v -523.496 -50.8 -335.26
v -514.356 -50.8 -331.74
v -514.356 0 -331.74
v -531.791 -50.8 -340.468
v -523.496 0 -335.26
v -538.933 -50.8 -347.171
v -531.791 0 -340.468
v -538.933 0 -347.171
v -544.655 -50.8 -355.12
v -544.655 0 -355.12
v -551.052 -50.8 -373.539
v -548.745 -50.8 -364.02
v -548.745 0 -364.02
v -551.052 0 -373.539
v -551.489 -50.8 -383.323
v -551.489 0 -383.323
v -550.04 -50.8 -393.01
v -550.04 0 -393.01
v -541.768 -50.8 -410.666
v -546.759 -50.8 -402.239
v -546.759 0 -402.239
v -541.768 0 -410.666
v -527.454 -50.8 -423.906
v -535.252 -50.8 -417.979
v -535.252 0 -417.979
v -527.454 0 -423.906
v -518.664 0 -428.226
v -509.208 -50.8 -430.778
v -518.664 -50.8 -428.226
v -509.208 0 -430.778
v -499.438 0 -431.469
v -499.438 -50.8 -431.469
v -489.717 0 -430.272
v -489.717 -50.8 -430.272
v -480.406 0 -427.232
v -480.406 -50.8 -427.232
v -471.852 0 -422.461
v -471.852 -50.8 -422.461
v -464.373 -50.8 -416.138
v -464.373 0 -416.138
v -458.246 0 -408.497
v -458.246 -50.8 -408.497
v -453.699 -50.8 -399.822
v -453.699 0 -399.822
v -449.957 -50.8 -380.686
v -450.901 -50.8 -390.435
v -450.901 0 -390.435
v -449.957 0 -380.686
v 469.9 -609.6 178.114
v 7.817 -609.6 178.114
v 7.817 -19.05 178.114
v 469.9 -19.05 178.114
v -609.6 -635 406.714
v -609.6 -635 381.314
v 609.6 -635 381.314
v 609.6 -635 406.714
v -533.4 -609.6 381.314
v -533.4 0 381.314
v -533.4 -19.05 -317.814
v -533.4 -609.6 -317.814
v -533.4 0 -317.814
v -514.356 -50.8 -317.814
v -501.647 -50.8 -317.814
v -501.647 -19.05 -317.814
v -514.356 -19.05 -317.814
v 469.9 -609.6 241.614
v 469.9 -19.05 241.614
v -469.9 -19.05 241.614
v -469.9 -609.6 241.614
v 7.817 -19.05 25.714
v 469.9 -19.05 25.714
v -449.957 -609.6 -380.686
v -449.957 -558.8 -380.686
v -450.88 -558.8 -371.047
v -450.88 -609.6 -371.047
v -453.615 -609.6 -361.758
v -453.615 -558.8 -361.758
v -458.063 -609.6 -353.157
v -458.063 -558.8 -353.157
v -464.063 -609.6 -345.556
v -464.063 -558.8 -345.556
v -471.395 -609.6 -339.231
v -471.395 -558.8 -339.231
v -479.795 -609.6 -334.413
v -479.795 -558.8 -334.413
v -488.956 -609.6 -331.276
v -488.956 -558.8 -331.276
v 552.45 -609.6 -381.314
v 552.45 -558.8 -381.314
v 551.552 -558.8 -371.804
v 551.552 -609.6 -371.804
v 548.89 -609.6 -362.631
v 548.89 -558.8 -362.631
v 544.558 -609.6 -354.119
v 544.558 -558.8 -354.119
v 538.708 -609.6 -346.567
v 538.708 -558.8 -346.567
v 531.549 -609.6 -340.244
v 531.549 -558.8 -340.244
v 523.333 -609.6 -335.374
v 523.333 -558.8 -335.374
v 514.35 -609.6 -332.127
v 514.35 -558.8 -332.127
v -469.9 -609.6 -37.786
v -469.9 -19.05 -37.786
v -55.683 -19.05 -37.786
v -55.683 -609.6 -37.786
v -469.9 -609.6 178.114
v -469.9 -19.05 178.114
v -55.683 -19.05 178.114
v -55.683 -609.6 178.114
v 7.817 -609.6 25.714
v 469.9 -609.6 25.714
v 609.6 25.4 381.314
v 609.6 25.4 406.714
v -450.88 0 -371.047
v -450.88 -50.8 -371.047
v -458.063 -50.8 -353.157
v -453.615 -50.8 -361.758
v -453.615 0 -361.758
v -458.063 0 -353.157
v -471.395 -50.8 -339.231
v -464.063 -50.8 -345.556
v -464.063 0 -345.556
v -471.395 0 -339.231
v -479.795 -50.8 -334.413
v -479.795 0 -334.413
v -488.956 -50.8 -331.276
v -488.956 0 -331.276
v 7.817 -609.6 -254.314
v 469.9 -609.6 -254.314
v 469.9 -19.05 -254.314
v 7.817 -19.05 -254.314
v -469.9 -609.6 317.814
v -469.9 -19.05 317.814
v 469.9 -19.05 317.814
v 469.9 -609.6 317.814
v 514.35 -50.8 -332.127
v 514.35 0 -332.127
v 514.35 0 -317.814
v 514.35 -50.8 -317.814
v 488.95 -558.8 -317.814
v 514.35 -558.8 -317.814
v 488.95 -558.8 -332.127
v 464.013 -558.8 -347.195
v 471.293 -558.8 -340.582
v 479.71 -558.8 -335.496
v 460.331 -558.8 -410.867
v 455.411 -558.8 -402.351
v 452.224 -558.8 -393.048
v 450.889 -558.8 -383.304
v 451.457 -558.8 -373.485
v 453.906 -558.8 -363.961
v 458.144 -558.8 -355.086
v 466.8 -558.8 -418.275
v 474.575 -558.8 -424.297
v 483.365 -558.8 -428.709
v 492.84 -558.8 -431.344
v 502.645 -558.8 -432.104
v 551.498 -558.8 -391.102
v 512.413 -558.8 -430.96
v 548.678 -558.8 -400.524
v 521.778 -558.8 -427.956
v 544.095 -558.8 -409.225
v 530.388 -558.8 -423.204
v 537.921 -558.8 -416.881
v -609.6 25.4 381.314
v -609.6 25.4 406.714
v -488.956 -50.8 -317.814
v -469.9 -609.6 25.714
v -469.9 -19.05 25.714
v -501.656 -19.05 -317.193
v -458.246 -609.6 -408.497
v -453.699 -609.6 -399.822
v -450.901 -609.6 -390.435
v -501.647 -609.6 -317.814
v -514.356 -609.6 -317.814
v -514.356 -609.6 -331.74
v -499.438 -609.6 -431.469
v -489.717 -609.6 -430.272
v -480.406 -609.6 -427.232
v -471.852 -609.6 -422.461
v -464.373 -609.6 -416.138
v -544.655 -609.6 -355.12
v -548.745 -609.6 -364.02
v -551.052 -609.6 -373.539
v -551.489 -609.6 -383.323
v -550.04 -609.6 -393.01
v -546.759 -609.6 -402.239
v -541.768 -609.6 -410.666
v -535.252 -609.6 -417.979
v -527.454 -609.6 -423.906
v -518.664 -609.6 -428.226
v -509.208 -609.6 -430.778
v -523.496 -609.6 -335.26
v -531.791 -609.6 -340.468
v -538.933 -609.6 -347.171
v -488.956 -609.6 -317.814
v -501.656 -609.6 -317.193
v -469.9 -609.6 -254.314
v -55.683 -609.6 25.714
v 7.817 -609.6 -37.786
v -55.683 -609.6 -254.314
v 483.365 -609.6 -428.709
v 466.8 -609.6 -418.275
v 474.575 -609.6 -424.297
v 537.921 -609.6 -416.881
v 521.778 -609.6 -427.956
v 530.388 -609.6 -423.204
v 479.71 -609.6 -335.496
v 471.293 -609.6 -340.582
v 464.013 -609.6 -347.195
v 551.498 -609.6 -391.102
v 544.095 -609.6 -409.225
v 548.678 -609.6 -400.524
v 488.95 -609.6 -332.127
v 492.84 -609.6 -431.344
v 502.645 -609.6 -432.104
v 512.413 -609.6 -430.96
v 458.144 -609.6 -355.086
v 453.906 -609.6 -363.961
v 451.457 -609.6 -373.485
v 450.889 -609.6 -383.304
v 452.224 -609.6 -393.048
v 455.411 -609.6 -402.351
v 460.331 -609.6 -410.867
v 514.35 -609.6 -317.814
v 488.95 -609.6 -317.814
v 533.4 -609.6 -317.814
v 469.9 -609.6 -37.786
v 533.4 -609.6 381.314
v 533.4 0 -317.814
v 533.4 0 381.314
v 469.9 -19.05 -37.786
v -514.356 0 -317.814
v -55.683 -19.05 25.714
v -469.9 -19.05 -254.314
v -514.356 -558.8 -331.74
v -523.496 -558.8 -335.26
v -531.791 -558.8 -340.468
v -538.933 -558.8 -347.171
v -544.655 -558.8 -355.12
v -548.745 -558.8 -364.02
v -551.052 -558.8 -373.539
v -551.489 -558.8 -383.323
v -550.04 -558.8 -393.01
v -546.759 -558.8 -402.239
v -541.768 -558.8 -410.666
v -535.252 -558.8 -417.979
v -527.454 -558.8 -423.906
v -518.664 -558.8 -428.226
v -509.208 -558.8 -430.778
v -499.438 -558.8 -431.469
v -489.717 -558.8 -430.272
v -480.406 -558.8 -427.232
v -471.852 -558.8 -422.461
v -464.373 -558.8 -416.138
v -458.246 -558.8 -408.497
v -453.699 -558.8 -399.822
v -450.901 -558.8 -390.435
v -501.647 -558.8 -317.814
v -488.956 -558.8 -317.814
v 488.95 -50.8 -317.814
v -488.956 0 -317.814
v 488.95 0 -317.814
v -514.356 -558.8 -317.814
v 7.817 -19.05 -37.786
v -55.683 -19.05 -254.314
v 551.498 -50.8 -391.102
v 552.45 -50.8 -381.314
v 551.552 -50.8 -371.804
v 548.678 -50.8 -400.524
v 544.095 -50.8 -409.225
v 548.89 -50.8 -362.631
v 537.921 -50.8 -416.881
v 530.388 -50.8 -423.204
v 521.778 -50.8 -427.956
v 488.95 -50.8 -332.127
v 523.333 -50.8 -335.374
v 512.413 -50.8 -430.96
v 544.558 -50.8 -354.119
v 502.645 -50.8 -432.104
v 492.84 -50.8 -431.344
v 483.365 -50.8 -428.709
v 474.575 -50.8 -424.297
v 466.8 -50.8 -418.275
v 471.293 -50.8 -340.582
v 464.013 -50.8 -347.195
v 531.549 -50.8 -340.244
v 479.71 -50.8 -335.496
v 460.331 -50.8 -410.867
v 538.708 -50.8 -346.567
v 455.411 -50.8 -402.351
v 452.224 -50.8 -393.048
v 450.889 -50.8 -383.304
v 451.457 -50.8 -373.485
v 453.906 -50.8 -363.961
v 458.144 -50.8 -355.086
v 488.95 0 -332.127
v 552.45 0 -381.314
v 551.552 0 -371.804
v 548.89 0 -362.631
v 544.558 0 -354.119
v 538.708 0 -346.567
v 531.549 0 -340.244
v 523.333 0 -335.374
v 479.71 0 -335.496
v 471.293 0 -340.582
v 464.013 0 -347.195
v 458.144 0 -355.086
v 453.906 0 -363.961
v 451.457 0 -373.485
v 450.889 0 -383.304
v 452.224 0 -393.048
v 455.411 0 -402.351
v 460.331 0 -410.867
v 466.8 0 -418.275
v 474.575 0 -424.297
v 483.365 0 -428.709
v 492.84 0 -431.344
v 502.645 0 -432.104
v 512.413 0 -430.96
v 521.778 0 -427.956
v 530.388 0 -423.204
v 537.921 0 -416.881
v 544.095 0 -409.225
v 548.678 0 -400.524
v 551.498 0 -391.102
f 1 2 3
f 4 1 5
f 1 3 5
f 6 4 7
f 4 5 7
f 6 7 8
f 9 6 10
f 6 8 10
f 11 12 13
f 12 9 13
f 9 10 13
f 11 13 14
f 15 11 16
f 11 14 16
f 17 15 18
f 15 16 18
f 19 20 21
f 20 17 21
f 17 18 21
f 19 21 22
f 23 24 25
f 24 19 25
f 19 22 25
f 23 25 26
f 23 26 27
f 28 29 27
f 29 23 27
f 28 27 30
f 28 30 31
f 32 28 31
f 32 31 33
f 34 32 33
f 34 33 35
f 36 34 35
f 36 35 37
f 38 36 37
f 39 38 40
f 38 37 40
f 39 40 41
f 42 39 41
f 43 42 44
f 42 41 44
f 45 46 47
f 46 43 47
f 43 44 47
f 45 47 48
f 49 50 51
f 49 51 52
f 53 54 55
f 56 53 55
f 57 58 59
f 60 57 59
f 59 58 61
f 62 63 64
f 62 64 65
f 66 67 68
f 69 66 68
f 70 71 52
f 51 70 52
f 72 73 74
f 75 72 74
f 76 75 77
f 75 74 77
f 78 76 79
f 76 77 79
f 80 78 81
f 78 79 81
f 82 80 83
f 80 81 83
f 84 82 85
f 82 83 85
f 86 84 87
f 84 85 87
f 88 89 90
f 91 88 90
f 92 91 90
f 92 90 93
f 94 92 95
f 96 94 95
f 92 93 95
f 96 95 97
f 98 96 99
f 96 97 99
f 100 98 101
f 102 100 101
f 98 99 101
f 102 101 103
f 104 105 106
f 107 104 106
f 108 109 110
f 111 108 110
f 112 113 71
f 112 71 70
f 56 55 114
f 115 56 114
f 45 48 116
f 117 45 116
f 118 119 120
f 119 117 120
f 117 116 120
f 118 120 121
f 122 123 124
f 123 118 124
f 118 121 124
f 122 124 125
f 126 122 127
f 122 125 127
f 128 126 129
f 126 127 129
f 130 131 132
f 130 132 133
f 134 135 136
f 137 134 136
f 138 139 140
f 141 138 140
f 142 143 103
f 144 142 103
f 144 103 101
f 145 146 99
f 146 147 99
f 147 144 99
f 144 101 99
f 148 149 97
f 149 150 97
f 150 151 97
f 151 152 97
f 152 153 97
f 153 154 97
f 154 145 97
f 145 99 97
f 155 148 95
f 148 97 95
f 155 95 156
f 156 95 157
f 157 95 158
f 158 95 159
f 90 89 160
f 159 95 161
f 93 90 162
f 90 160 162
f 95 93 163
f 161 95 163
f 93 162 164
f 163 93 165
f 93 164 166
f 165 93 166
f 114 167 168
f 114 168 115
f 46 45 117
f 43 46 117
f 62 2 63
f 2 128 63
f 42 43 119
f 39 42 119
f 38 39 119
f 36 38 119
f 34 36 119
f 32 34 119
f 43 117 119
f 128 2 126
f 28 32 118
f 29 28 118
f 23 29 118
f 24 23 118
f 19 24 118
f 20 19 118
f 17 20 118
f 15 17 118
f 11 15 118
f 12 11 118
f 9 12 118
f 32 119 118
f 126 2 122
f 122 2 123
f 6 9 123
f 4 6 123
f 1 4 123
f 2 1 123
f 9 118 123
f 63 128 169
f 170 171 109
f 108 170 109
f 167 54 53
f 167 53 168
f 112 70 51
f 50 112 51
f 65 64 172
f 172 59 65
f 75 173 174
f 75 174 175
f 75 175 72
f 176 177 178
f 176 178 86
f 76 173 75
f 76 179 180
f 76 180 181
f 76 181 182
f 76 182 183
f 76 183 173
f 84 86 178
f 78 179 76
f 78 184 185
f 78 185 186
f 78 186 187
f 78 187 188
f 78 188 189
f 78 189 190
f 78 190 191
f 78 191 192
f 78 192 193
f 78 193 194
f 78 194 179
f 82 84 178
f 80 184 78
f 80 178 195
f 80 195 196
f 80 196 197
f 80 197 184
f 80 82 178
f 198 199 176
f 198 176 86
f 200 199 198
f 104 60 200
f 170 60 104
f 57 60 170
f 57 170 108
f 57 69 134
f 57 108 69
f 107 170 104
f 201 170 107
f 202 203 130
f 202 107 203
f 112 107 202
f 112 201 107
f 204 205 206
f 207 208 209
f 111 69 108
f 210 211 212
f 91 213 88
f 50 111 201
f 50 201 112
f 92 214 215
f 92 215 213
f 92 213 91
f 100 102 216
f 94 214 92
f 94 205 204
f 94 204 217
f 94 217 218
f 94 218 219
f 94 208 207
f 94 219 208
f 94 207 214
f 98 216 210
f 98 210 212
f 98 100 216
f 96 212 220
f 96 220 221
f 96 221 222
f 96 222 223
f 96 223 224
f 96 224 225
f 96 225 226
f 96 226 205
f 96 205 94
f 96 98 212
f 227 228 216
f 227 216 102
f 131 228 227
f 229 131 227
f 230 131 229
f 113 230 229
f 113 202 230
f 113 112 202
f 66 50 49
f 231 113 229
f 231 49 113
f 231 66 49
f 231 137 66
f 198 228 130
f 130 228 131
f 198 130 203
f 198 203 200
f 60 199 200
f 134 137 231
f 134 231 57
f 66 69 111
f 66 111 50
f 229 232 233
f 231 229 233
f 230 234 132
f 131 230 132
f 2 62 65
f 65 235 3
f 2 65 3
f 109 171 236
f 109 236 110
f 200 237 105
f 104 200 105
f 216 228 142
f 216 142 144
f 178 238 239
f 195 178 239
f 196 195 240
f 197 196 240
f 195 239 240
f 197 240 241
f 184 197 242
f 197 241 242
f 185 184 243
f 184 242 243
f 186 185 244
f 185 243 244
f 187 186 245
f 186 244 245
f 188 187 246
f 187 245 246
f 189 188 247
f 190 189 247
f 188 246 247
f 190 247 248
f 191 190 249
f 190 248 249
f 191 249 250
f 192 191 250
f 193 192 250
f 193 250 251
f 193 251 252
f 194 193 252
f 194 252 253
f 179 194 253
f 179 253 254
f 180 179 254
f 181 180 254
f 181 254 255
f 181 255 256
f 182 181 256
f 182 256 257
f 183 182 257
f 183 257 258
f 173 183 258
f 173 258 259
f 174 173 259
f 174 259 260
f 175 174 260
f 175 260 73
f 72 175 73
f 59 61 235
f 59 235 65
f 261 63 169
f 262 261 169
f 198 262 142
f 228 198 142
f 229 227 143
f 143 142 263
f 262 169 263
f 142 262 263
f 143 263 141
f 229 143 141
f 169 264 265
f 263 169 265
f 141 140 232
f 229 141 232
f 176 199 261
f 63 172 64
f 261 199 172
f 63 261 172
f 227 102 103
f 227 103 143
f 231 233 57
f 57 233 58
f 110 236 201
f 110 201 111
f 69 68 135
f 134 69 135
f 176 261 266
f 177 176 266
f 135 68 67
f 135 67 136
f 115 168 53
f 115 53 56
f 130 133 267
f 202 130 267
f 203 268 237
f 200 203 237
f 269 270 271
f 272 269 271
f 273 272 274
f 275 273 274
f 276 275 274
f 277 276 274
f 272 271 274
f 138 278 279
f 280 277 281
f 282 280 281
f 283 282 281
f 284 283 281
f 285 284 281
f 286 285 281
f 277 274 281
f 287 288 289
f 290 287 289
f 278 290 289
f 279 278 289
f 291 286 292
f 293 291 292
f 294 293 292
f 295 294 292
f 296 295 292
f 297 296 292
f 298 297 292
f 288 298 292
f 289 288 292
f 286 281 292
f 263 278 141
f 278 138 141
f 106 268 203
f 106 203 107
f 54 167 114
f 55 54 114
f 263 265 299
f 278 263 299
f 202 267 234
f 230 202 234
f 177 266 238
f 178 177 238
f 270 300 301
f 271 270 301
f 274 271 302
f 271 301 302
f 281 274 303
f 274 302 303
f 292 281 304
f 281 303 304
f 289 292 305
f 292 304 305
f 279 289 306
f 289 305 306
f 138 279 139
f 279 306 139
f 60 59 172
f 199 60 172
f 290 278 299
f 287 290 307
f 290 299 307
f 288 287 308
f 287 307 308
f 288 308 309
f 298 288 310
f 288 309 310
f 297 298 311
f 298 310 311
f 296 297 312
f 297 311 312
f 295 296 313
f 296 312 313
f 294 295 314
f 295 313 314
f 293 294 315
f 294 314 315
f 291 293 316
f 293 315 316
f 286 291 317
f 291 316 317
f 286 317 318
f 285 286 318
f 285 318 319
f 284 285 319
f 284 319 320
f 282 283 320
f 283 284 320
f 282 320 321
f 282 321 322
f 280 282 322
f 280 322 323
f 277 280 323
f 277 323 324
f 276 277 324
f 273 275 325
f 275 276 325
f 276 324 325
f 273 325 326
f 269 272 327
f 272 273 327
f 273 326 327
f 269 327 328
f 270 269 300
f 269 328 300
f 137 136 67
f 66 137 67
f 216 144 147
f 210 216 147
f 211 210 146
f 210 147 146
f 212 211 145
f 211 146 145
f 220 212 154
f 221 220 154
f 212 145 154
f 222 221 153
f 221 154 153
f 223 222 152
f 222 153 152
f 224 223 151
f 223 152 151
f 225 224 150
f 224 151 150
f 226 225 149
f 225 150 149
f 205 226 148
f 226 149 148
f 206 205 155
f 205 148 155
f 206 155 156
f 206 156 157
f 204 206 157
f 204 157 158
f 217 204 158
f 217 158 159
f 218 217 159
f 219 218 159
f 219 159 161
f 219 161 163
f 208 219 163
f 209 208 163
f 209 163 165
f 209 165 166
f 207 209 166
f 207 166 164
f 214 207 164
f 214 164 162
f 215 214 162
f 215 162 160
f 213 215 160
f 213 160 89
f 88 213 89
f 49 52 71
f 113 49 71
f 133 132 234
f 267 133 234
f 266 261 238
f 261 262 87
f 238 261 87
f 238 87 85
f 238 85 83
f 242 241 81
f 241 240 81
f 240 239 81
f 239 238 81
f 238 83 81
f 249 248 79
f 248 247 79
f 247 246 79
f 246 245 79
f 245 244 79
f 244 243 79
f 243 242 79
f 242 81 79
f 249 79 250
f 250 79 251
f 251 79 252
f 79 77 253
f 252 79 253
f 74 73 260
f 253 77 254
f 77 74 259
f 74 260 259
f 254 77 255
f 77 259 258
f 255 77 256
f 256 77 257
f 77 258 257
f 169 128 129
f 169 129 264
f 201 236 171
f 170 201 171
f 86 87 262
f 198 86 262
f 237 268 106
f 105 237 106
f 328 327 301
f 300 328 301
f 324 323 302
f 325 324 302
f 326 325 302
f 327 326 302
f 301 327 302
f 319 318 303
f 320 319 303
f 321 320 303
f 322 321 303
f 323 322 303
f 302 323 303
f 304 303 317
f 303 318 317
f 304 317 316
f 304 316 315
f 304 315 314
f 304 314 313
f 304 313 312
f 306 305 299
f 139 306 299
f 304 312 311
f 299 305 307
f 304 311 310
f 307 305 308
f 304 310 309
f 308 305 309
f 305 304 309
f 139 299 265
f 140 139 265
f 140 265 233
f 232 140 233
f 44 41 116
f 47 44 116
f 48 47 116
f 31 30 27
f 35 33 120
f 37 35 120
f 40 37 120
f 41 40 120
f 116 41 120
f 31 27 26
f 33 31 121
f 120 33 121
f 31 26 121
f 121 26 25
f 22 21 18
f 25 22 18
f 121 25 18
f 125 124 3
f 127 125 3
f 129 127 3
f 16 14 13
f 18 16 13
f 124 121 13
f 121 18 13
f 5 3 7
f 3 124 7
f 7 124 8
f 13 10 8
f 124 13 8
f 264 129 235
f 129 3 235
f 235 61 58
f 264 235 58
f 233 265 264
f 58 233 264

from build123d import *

# Parameters (mm, degrees)
F0_W     = 414.2166706732
F0_H     = 63.5
F0_W_2   = 63.5
F0_H_2   = 216.5272635669
F0_W_3   = 462.0833293268
F0_H_3   = 152.4
F1_DEPTH = 609.6
F2_DEPTH = 609.6
F5_DEPTH = 1242.06
F6_W     = 19.05
F6_H     = 699.1272635669
F7_DEPTH = 1066.8
F8_W     = 1219.2
F8_H     = 660.4
F8_W_2   = 1066.8
F8_H_2   = 609.6
F9_DEPTH = 25.4


with BuildPart() as f1:
    # F0 (on Front) → F1 (new body)
    with BuildSketch(Plane.XZ):
        Polygon((469.9, -273.3665645704), (469.9, -317.8136317834), (488.95, -317.8136317834), (488.95, -292.4136317834), (514.35, -292.4136317834), (514.35, -317.8136317834), (533.4, -317.8136317834), (533.4, 317.8136317834), (469.9, 317.8136317834), (469.9, 241.6136317834), (469.9, 178.1136317834), (469.9, 25.7136317834), (469.9, -37.7863682166), (469.9, -254.3136317834), align=None)
        Polygon((-469.9, -317.8136317834), (469.9, -317.8136317834), (469.9, -273.3665645704), (469.9, -254.3136317834), (7.8166706732, -254.3136317834), (-55.6833293268, -254.3136317834), (-469.9, -254.3136317834), align=None)
        Polygon((-488.9560716881, -317.8136317834), (-469.9, -317.8136317834), (-469.9, -254.3136317834), (-469.9, -37.7863682166), (-469.9, 25.7136317834), (-469.9, 178.1136317834), (-469.9, 241.6136317834), (-469.9, 317.8136317834), (-533.4, 317.8136317834), (-533.4, -317.8136317834), (-514.3560716881, -317.4411400029), (-514.3560716881, -291.792732976), (-488.9560716881, -291.792732976), align=None)
        Polygon((488.95, -292.4136317834), (488.95, -317.8136317834), (501.65, -317.8136317834), (514.35, -317.8136317834), (514.35, -292.4136317834), align=None)
        Polygon((-501.6472799932, -317.8136317834), (-488.9560716881, -317.8136317834), (-488.9560716881, -291.792732976), (-514.3560716881, -291.792732976), (-514.3560716881, -317.4411400029), (-501.6560716881, -317.192732976), align=None)
        with Locations((-262.7916646634, -6.0363682166)):
            Rectangle(F0_W, F0_H)
        with Locations((-23.9333293268, -146.05)):
            Rectangle(F0_W_2, F0_H_2)
        with Locations((238.8583353366, -6.0363682166)):
            Rectangle(F0_W_3, F0_H)
        with Locations((-23.9333293268, -6.0363682166)):
            Rectangle(F0_W_2, F0_H)
        Polygon((-469.9, 241.6136317834), (-469.9, 178.1136317834), (-55.6833293268, 178.1136317834), (7.8166706732, 178.1136317834), (469.9, 178.1136317834), (469.9, 241.6136317834), align=None)
        with Locations((-23.9333293268, 101.9136317834)):
            Rectangle(F0_W_2, F0_H_3)
        Polygon((469.9, 317.8136317834), (533.4, 317.8136317834), (533.4, 381.3136317834), (-533.4, 381.3136317834), (-533.4, 317.8136317834), (-469.9, 317.8136317834), align=None)
    extrude(amount=F1_DEPTH)

    # F0 (on Front) → F2 (join)
    with BuildSketch(Plane.XZ):
        with BuildLine():
            ThreePointArc((-449.9570255615, -380.6863682166), (-460.8814161194, -349.2129544898), (-488.9560716881, -331.2760708315))
            Line((-488.9560716881, -331.2760708315), (-488.9560716881, -342.592732976))
            Line((-488.9560716881, -342.592732976), (-501.2964171884, -342.592732976))
            Line((-501.2964171884, -342.592732976), (-514.3560716881, -342.592732976))
            Line((-514.3560716881, -342.592732976), (-514.3560716881, -331.7404190027))
            ThreePointArc((-514.3560716881, -331.7404190027), (-531.4963200945, -421.1305986038), (-449.9570255615, -380.6863682166))
        make_face()
        with BuildLine():
            Line((-501.2964171884, -342.592732976), (-501.4762624628, -329.8914600241))
            ThreePointArc((-501.4762624628, -329.8914600241), (-507.9756105712, -330.4018573762), (-514.3560716881, -331.7404190027))
            Line((-514.3560716881, -331.7404190027), (-514.3560716881, -342.592732976))
            Line((-514.3560716881, -342.592732976), (-501.2964171884, -342.592732976))
        make_face()
        with BuildLine():
            Line((-501.4762624628, -329.8914600241), (-501.6472799932, -317.8136317834))
            Line((-501.6472799932, -317.8136317834), (-514.3560716881, -317.8136317834))
            Line((-514.3560716881, -317.8136317834), (-514.3560716881, -331.7404190027))
            ThreePointArc((-514.3560716881, -331.7404190027), (-507.9756105712, -330.4018573762), (-501.4762624628, -329.8914600241))
        make_face()
        with BuildLine():
            Line((-488.9560716881, -331.2760708315), (-488.9560716881, -317.8136317834))
            Line((-488.9560716881, -317.8136317834), (-501.6472799932, -317.8136317834))
            Line((-501.6472799932, -317.8136317834), (-501.4762624628, -329.8914600241))
            ThreePointArc((-501.4762624628, -329.8914600241), (-495.1730843427, -330.194194561), (-488.9560716881, -331.2760708315))
        make_face()
        with BuildLine():
            Line((-488.9560716881, -342.592732976), (-488.9560716881, -331.2760708315))
            ThreePointArc((-488.9560716881, -331.2760708315), (-495.1730843427, -330.194194561), (-501.4762624628, -329.8914600241))
            Line((-501.4762624628, -329.8914600241), (-501.2964171884, -342.592732976))
            Line((-501.2964171884, -342.592732976), (-488.9560716881, -342.592732976))
        make_face()
        with BuildLine():
            Line((488.95, -343.2136317834), (488.95, -332.1267432866))
            ThreePointArc((488.95, -332.1267432866), (470.5414802667, -421.4745580676), (552.45, -381.3136317834))
            ThreePointArc((552.45, -381.3136317834), (541.8109262841, -350.2051120501), (514.35, -332.1267432866))
            Line((514.35, -332.1267432866), (514.35, -343.2136317834))
            Line((514.35, -343.2136317834), (501.65, -343.2136317834))
            Line((501.65, -343.2136317834), (488.95, -343.2136317834))
        make_face()
        with BuildLine():
            ThreePointArc((514.35, -332.1267432866), (508.0510180581, -330.9185232131), (501.65, -330.5136317834))
            Line((501.65, -330.5136317834), (501.65, -343.2136317834))
            Line((501.65, -343.2136317834), (514.35, -343.2136317834))
            Line((514.35, -343.2136317834), (514.35, -332.1267432866))
        make_face()
        with BuildLine():
            Line((501.65, -317.8136317834), (488.95, -317.8136317834))
            Line((488.95, -317.8136317834), (488.95, -332.1267432866))
            ThreePointArc((488.95, -332.1267432866), (495.2489819419, -330.9185232131), (501.65, -330.5136317834))
            Line((501.65, -330.5136317834), (501.65, -317.8136317834))
        make_face()
        with BuildLine():
            Line((514.35, -317.8136317834), (501.65, -317.8136317834))
            Line((501.65, -317.8136317834), (501.65, -330.5136317834))
            ThreePointArc((501.65, -330.5136317834), (508.0510180581, -330.9185232131), (514.35, -332.1267432866))
            Line((514.35, -332.1267432866), (514.35, -317.8136317834))
        make_face()
        with BuildLine():
            ThreePointArc((501.65, -330.5136317834), (495.2489819419, -330.9185232131), (488.95, -332.1267432866))
            Line((488.95, -332.1267432866), (488.95, -343.2136317834))
            Line((488.95, -343.2136317834), (501.65, -343.2136317834))
            Line((501.65, -343.2136317834), (501.65, -330.5136317834))
        make_face()
    extrude(amount=F2_DEPTH)

    # F4 (on offset) → F5 (cut)
    with BuildSketch(Plane.YZ.offset(660.4)):
        Polygon((-50.8, -317.8136317834), (-558.8, -317.8136317834), (-558.8, -353.9129836664), (-558.8, -456.8212373361), (-50.8, -456.8212373361), (-50.8, -353.9129836664), align=None)
    extrude(amount=-F5_DEPTH, mode=Mode.SUBTRACT)

    # F6 (on face) → F7 (join)
    with BuildSketch(Plane(origin=(-533.4, 0, 0), x_dir=(0, -1, 0), z_dir=(-1, 0, 0))):
        with Locations((9.525, 31.75)):
            Rectangle(F6_W, F6_H)
    extrude(amount=-F7_DEPTH)


with BuildPart() as f9:
    # F8 (on face) → F9 (new body)
    with BuildSketch(Plane.XY.offset(381.3136317834)):
        with Locations((0, -304.8)):
            Rectangle(F8_W, F8_H)
        with Locations((0, -304.8)):
            Rectangle(F8_W_2, F8_H_2, mode=Mode.SUBTRACT)
        with Locations((0, -304.8)):
            Rectangle(F8_W_2, F8_H_2)
    extrude(amount=F9_DEPTH)


solid = Compound([f1.part, f9.part])
